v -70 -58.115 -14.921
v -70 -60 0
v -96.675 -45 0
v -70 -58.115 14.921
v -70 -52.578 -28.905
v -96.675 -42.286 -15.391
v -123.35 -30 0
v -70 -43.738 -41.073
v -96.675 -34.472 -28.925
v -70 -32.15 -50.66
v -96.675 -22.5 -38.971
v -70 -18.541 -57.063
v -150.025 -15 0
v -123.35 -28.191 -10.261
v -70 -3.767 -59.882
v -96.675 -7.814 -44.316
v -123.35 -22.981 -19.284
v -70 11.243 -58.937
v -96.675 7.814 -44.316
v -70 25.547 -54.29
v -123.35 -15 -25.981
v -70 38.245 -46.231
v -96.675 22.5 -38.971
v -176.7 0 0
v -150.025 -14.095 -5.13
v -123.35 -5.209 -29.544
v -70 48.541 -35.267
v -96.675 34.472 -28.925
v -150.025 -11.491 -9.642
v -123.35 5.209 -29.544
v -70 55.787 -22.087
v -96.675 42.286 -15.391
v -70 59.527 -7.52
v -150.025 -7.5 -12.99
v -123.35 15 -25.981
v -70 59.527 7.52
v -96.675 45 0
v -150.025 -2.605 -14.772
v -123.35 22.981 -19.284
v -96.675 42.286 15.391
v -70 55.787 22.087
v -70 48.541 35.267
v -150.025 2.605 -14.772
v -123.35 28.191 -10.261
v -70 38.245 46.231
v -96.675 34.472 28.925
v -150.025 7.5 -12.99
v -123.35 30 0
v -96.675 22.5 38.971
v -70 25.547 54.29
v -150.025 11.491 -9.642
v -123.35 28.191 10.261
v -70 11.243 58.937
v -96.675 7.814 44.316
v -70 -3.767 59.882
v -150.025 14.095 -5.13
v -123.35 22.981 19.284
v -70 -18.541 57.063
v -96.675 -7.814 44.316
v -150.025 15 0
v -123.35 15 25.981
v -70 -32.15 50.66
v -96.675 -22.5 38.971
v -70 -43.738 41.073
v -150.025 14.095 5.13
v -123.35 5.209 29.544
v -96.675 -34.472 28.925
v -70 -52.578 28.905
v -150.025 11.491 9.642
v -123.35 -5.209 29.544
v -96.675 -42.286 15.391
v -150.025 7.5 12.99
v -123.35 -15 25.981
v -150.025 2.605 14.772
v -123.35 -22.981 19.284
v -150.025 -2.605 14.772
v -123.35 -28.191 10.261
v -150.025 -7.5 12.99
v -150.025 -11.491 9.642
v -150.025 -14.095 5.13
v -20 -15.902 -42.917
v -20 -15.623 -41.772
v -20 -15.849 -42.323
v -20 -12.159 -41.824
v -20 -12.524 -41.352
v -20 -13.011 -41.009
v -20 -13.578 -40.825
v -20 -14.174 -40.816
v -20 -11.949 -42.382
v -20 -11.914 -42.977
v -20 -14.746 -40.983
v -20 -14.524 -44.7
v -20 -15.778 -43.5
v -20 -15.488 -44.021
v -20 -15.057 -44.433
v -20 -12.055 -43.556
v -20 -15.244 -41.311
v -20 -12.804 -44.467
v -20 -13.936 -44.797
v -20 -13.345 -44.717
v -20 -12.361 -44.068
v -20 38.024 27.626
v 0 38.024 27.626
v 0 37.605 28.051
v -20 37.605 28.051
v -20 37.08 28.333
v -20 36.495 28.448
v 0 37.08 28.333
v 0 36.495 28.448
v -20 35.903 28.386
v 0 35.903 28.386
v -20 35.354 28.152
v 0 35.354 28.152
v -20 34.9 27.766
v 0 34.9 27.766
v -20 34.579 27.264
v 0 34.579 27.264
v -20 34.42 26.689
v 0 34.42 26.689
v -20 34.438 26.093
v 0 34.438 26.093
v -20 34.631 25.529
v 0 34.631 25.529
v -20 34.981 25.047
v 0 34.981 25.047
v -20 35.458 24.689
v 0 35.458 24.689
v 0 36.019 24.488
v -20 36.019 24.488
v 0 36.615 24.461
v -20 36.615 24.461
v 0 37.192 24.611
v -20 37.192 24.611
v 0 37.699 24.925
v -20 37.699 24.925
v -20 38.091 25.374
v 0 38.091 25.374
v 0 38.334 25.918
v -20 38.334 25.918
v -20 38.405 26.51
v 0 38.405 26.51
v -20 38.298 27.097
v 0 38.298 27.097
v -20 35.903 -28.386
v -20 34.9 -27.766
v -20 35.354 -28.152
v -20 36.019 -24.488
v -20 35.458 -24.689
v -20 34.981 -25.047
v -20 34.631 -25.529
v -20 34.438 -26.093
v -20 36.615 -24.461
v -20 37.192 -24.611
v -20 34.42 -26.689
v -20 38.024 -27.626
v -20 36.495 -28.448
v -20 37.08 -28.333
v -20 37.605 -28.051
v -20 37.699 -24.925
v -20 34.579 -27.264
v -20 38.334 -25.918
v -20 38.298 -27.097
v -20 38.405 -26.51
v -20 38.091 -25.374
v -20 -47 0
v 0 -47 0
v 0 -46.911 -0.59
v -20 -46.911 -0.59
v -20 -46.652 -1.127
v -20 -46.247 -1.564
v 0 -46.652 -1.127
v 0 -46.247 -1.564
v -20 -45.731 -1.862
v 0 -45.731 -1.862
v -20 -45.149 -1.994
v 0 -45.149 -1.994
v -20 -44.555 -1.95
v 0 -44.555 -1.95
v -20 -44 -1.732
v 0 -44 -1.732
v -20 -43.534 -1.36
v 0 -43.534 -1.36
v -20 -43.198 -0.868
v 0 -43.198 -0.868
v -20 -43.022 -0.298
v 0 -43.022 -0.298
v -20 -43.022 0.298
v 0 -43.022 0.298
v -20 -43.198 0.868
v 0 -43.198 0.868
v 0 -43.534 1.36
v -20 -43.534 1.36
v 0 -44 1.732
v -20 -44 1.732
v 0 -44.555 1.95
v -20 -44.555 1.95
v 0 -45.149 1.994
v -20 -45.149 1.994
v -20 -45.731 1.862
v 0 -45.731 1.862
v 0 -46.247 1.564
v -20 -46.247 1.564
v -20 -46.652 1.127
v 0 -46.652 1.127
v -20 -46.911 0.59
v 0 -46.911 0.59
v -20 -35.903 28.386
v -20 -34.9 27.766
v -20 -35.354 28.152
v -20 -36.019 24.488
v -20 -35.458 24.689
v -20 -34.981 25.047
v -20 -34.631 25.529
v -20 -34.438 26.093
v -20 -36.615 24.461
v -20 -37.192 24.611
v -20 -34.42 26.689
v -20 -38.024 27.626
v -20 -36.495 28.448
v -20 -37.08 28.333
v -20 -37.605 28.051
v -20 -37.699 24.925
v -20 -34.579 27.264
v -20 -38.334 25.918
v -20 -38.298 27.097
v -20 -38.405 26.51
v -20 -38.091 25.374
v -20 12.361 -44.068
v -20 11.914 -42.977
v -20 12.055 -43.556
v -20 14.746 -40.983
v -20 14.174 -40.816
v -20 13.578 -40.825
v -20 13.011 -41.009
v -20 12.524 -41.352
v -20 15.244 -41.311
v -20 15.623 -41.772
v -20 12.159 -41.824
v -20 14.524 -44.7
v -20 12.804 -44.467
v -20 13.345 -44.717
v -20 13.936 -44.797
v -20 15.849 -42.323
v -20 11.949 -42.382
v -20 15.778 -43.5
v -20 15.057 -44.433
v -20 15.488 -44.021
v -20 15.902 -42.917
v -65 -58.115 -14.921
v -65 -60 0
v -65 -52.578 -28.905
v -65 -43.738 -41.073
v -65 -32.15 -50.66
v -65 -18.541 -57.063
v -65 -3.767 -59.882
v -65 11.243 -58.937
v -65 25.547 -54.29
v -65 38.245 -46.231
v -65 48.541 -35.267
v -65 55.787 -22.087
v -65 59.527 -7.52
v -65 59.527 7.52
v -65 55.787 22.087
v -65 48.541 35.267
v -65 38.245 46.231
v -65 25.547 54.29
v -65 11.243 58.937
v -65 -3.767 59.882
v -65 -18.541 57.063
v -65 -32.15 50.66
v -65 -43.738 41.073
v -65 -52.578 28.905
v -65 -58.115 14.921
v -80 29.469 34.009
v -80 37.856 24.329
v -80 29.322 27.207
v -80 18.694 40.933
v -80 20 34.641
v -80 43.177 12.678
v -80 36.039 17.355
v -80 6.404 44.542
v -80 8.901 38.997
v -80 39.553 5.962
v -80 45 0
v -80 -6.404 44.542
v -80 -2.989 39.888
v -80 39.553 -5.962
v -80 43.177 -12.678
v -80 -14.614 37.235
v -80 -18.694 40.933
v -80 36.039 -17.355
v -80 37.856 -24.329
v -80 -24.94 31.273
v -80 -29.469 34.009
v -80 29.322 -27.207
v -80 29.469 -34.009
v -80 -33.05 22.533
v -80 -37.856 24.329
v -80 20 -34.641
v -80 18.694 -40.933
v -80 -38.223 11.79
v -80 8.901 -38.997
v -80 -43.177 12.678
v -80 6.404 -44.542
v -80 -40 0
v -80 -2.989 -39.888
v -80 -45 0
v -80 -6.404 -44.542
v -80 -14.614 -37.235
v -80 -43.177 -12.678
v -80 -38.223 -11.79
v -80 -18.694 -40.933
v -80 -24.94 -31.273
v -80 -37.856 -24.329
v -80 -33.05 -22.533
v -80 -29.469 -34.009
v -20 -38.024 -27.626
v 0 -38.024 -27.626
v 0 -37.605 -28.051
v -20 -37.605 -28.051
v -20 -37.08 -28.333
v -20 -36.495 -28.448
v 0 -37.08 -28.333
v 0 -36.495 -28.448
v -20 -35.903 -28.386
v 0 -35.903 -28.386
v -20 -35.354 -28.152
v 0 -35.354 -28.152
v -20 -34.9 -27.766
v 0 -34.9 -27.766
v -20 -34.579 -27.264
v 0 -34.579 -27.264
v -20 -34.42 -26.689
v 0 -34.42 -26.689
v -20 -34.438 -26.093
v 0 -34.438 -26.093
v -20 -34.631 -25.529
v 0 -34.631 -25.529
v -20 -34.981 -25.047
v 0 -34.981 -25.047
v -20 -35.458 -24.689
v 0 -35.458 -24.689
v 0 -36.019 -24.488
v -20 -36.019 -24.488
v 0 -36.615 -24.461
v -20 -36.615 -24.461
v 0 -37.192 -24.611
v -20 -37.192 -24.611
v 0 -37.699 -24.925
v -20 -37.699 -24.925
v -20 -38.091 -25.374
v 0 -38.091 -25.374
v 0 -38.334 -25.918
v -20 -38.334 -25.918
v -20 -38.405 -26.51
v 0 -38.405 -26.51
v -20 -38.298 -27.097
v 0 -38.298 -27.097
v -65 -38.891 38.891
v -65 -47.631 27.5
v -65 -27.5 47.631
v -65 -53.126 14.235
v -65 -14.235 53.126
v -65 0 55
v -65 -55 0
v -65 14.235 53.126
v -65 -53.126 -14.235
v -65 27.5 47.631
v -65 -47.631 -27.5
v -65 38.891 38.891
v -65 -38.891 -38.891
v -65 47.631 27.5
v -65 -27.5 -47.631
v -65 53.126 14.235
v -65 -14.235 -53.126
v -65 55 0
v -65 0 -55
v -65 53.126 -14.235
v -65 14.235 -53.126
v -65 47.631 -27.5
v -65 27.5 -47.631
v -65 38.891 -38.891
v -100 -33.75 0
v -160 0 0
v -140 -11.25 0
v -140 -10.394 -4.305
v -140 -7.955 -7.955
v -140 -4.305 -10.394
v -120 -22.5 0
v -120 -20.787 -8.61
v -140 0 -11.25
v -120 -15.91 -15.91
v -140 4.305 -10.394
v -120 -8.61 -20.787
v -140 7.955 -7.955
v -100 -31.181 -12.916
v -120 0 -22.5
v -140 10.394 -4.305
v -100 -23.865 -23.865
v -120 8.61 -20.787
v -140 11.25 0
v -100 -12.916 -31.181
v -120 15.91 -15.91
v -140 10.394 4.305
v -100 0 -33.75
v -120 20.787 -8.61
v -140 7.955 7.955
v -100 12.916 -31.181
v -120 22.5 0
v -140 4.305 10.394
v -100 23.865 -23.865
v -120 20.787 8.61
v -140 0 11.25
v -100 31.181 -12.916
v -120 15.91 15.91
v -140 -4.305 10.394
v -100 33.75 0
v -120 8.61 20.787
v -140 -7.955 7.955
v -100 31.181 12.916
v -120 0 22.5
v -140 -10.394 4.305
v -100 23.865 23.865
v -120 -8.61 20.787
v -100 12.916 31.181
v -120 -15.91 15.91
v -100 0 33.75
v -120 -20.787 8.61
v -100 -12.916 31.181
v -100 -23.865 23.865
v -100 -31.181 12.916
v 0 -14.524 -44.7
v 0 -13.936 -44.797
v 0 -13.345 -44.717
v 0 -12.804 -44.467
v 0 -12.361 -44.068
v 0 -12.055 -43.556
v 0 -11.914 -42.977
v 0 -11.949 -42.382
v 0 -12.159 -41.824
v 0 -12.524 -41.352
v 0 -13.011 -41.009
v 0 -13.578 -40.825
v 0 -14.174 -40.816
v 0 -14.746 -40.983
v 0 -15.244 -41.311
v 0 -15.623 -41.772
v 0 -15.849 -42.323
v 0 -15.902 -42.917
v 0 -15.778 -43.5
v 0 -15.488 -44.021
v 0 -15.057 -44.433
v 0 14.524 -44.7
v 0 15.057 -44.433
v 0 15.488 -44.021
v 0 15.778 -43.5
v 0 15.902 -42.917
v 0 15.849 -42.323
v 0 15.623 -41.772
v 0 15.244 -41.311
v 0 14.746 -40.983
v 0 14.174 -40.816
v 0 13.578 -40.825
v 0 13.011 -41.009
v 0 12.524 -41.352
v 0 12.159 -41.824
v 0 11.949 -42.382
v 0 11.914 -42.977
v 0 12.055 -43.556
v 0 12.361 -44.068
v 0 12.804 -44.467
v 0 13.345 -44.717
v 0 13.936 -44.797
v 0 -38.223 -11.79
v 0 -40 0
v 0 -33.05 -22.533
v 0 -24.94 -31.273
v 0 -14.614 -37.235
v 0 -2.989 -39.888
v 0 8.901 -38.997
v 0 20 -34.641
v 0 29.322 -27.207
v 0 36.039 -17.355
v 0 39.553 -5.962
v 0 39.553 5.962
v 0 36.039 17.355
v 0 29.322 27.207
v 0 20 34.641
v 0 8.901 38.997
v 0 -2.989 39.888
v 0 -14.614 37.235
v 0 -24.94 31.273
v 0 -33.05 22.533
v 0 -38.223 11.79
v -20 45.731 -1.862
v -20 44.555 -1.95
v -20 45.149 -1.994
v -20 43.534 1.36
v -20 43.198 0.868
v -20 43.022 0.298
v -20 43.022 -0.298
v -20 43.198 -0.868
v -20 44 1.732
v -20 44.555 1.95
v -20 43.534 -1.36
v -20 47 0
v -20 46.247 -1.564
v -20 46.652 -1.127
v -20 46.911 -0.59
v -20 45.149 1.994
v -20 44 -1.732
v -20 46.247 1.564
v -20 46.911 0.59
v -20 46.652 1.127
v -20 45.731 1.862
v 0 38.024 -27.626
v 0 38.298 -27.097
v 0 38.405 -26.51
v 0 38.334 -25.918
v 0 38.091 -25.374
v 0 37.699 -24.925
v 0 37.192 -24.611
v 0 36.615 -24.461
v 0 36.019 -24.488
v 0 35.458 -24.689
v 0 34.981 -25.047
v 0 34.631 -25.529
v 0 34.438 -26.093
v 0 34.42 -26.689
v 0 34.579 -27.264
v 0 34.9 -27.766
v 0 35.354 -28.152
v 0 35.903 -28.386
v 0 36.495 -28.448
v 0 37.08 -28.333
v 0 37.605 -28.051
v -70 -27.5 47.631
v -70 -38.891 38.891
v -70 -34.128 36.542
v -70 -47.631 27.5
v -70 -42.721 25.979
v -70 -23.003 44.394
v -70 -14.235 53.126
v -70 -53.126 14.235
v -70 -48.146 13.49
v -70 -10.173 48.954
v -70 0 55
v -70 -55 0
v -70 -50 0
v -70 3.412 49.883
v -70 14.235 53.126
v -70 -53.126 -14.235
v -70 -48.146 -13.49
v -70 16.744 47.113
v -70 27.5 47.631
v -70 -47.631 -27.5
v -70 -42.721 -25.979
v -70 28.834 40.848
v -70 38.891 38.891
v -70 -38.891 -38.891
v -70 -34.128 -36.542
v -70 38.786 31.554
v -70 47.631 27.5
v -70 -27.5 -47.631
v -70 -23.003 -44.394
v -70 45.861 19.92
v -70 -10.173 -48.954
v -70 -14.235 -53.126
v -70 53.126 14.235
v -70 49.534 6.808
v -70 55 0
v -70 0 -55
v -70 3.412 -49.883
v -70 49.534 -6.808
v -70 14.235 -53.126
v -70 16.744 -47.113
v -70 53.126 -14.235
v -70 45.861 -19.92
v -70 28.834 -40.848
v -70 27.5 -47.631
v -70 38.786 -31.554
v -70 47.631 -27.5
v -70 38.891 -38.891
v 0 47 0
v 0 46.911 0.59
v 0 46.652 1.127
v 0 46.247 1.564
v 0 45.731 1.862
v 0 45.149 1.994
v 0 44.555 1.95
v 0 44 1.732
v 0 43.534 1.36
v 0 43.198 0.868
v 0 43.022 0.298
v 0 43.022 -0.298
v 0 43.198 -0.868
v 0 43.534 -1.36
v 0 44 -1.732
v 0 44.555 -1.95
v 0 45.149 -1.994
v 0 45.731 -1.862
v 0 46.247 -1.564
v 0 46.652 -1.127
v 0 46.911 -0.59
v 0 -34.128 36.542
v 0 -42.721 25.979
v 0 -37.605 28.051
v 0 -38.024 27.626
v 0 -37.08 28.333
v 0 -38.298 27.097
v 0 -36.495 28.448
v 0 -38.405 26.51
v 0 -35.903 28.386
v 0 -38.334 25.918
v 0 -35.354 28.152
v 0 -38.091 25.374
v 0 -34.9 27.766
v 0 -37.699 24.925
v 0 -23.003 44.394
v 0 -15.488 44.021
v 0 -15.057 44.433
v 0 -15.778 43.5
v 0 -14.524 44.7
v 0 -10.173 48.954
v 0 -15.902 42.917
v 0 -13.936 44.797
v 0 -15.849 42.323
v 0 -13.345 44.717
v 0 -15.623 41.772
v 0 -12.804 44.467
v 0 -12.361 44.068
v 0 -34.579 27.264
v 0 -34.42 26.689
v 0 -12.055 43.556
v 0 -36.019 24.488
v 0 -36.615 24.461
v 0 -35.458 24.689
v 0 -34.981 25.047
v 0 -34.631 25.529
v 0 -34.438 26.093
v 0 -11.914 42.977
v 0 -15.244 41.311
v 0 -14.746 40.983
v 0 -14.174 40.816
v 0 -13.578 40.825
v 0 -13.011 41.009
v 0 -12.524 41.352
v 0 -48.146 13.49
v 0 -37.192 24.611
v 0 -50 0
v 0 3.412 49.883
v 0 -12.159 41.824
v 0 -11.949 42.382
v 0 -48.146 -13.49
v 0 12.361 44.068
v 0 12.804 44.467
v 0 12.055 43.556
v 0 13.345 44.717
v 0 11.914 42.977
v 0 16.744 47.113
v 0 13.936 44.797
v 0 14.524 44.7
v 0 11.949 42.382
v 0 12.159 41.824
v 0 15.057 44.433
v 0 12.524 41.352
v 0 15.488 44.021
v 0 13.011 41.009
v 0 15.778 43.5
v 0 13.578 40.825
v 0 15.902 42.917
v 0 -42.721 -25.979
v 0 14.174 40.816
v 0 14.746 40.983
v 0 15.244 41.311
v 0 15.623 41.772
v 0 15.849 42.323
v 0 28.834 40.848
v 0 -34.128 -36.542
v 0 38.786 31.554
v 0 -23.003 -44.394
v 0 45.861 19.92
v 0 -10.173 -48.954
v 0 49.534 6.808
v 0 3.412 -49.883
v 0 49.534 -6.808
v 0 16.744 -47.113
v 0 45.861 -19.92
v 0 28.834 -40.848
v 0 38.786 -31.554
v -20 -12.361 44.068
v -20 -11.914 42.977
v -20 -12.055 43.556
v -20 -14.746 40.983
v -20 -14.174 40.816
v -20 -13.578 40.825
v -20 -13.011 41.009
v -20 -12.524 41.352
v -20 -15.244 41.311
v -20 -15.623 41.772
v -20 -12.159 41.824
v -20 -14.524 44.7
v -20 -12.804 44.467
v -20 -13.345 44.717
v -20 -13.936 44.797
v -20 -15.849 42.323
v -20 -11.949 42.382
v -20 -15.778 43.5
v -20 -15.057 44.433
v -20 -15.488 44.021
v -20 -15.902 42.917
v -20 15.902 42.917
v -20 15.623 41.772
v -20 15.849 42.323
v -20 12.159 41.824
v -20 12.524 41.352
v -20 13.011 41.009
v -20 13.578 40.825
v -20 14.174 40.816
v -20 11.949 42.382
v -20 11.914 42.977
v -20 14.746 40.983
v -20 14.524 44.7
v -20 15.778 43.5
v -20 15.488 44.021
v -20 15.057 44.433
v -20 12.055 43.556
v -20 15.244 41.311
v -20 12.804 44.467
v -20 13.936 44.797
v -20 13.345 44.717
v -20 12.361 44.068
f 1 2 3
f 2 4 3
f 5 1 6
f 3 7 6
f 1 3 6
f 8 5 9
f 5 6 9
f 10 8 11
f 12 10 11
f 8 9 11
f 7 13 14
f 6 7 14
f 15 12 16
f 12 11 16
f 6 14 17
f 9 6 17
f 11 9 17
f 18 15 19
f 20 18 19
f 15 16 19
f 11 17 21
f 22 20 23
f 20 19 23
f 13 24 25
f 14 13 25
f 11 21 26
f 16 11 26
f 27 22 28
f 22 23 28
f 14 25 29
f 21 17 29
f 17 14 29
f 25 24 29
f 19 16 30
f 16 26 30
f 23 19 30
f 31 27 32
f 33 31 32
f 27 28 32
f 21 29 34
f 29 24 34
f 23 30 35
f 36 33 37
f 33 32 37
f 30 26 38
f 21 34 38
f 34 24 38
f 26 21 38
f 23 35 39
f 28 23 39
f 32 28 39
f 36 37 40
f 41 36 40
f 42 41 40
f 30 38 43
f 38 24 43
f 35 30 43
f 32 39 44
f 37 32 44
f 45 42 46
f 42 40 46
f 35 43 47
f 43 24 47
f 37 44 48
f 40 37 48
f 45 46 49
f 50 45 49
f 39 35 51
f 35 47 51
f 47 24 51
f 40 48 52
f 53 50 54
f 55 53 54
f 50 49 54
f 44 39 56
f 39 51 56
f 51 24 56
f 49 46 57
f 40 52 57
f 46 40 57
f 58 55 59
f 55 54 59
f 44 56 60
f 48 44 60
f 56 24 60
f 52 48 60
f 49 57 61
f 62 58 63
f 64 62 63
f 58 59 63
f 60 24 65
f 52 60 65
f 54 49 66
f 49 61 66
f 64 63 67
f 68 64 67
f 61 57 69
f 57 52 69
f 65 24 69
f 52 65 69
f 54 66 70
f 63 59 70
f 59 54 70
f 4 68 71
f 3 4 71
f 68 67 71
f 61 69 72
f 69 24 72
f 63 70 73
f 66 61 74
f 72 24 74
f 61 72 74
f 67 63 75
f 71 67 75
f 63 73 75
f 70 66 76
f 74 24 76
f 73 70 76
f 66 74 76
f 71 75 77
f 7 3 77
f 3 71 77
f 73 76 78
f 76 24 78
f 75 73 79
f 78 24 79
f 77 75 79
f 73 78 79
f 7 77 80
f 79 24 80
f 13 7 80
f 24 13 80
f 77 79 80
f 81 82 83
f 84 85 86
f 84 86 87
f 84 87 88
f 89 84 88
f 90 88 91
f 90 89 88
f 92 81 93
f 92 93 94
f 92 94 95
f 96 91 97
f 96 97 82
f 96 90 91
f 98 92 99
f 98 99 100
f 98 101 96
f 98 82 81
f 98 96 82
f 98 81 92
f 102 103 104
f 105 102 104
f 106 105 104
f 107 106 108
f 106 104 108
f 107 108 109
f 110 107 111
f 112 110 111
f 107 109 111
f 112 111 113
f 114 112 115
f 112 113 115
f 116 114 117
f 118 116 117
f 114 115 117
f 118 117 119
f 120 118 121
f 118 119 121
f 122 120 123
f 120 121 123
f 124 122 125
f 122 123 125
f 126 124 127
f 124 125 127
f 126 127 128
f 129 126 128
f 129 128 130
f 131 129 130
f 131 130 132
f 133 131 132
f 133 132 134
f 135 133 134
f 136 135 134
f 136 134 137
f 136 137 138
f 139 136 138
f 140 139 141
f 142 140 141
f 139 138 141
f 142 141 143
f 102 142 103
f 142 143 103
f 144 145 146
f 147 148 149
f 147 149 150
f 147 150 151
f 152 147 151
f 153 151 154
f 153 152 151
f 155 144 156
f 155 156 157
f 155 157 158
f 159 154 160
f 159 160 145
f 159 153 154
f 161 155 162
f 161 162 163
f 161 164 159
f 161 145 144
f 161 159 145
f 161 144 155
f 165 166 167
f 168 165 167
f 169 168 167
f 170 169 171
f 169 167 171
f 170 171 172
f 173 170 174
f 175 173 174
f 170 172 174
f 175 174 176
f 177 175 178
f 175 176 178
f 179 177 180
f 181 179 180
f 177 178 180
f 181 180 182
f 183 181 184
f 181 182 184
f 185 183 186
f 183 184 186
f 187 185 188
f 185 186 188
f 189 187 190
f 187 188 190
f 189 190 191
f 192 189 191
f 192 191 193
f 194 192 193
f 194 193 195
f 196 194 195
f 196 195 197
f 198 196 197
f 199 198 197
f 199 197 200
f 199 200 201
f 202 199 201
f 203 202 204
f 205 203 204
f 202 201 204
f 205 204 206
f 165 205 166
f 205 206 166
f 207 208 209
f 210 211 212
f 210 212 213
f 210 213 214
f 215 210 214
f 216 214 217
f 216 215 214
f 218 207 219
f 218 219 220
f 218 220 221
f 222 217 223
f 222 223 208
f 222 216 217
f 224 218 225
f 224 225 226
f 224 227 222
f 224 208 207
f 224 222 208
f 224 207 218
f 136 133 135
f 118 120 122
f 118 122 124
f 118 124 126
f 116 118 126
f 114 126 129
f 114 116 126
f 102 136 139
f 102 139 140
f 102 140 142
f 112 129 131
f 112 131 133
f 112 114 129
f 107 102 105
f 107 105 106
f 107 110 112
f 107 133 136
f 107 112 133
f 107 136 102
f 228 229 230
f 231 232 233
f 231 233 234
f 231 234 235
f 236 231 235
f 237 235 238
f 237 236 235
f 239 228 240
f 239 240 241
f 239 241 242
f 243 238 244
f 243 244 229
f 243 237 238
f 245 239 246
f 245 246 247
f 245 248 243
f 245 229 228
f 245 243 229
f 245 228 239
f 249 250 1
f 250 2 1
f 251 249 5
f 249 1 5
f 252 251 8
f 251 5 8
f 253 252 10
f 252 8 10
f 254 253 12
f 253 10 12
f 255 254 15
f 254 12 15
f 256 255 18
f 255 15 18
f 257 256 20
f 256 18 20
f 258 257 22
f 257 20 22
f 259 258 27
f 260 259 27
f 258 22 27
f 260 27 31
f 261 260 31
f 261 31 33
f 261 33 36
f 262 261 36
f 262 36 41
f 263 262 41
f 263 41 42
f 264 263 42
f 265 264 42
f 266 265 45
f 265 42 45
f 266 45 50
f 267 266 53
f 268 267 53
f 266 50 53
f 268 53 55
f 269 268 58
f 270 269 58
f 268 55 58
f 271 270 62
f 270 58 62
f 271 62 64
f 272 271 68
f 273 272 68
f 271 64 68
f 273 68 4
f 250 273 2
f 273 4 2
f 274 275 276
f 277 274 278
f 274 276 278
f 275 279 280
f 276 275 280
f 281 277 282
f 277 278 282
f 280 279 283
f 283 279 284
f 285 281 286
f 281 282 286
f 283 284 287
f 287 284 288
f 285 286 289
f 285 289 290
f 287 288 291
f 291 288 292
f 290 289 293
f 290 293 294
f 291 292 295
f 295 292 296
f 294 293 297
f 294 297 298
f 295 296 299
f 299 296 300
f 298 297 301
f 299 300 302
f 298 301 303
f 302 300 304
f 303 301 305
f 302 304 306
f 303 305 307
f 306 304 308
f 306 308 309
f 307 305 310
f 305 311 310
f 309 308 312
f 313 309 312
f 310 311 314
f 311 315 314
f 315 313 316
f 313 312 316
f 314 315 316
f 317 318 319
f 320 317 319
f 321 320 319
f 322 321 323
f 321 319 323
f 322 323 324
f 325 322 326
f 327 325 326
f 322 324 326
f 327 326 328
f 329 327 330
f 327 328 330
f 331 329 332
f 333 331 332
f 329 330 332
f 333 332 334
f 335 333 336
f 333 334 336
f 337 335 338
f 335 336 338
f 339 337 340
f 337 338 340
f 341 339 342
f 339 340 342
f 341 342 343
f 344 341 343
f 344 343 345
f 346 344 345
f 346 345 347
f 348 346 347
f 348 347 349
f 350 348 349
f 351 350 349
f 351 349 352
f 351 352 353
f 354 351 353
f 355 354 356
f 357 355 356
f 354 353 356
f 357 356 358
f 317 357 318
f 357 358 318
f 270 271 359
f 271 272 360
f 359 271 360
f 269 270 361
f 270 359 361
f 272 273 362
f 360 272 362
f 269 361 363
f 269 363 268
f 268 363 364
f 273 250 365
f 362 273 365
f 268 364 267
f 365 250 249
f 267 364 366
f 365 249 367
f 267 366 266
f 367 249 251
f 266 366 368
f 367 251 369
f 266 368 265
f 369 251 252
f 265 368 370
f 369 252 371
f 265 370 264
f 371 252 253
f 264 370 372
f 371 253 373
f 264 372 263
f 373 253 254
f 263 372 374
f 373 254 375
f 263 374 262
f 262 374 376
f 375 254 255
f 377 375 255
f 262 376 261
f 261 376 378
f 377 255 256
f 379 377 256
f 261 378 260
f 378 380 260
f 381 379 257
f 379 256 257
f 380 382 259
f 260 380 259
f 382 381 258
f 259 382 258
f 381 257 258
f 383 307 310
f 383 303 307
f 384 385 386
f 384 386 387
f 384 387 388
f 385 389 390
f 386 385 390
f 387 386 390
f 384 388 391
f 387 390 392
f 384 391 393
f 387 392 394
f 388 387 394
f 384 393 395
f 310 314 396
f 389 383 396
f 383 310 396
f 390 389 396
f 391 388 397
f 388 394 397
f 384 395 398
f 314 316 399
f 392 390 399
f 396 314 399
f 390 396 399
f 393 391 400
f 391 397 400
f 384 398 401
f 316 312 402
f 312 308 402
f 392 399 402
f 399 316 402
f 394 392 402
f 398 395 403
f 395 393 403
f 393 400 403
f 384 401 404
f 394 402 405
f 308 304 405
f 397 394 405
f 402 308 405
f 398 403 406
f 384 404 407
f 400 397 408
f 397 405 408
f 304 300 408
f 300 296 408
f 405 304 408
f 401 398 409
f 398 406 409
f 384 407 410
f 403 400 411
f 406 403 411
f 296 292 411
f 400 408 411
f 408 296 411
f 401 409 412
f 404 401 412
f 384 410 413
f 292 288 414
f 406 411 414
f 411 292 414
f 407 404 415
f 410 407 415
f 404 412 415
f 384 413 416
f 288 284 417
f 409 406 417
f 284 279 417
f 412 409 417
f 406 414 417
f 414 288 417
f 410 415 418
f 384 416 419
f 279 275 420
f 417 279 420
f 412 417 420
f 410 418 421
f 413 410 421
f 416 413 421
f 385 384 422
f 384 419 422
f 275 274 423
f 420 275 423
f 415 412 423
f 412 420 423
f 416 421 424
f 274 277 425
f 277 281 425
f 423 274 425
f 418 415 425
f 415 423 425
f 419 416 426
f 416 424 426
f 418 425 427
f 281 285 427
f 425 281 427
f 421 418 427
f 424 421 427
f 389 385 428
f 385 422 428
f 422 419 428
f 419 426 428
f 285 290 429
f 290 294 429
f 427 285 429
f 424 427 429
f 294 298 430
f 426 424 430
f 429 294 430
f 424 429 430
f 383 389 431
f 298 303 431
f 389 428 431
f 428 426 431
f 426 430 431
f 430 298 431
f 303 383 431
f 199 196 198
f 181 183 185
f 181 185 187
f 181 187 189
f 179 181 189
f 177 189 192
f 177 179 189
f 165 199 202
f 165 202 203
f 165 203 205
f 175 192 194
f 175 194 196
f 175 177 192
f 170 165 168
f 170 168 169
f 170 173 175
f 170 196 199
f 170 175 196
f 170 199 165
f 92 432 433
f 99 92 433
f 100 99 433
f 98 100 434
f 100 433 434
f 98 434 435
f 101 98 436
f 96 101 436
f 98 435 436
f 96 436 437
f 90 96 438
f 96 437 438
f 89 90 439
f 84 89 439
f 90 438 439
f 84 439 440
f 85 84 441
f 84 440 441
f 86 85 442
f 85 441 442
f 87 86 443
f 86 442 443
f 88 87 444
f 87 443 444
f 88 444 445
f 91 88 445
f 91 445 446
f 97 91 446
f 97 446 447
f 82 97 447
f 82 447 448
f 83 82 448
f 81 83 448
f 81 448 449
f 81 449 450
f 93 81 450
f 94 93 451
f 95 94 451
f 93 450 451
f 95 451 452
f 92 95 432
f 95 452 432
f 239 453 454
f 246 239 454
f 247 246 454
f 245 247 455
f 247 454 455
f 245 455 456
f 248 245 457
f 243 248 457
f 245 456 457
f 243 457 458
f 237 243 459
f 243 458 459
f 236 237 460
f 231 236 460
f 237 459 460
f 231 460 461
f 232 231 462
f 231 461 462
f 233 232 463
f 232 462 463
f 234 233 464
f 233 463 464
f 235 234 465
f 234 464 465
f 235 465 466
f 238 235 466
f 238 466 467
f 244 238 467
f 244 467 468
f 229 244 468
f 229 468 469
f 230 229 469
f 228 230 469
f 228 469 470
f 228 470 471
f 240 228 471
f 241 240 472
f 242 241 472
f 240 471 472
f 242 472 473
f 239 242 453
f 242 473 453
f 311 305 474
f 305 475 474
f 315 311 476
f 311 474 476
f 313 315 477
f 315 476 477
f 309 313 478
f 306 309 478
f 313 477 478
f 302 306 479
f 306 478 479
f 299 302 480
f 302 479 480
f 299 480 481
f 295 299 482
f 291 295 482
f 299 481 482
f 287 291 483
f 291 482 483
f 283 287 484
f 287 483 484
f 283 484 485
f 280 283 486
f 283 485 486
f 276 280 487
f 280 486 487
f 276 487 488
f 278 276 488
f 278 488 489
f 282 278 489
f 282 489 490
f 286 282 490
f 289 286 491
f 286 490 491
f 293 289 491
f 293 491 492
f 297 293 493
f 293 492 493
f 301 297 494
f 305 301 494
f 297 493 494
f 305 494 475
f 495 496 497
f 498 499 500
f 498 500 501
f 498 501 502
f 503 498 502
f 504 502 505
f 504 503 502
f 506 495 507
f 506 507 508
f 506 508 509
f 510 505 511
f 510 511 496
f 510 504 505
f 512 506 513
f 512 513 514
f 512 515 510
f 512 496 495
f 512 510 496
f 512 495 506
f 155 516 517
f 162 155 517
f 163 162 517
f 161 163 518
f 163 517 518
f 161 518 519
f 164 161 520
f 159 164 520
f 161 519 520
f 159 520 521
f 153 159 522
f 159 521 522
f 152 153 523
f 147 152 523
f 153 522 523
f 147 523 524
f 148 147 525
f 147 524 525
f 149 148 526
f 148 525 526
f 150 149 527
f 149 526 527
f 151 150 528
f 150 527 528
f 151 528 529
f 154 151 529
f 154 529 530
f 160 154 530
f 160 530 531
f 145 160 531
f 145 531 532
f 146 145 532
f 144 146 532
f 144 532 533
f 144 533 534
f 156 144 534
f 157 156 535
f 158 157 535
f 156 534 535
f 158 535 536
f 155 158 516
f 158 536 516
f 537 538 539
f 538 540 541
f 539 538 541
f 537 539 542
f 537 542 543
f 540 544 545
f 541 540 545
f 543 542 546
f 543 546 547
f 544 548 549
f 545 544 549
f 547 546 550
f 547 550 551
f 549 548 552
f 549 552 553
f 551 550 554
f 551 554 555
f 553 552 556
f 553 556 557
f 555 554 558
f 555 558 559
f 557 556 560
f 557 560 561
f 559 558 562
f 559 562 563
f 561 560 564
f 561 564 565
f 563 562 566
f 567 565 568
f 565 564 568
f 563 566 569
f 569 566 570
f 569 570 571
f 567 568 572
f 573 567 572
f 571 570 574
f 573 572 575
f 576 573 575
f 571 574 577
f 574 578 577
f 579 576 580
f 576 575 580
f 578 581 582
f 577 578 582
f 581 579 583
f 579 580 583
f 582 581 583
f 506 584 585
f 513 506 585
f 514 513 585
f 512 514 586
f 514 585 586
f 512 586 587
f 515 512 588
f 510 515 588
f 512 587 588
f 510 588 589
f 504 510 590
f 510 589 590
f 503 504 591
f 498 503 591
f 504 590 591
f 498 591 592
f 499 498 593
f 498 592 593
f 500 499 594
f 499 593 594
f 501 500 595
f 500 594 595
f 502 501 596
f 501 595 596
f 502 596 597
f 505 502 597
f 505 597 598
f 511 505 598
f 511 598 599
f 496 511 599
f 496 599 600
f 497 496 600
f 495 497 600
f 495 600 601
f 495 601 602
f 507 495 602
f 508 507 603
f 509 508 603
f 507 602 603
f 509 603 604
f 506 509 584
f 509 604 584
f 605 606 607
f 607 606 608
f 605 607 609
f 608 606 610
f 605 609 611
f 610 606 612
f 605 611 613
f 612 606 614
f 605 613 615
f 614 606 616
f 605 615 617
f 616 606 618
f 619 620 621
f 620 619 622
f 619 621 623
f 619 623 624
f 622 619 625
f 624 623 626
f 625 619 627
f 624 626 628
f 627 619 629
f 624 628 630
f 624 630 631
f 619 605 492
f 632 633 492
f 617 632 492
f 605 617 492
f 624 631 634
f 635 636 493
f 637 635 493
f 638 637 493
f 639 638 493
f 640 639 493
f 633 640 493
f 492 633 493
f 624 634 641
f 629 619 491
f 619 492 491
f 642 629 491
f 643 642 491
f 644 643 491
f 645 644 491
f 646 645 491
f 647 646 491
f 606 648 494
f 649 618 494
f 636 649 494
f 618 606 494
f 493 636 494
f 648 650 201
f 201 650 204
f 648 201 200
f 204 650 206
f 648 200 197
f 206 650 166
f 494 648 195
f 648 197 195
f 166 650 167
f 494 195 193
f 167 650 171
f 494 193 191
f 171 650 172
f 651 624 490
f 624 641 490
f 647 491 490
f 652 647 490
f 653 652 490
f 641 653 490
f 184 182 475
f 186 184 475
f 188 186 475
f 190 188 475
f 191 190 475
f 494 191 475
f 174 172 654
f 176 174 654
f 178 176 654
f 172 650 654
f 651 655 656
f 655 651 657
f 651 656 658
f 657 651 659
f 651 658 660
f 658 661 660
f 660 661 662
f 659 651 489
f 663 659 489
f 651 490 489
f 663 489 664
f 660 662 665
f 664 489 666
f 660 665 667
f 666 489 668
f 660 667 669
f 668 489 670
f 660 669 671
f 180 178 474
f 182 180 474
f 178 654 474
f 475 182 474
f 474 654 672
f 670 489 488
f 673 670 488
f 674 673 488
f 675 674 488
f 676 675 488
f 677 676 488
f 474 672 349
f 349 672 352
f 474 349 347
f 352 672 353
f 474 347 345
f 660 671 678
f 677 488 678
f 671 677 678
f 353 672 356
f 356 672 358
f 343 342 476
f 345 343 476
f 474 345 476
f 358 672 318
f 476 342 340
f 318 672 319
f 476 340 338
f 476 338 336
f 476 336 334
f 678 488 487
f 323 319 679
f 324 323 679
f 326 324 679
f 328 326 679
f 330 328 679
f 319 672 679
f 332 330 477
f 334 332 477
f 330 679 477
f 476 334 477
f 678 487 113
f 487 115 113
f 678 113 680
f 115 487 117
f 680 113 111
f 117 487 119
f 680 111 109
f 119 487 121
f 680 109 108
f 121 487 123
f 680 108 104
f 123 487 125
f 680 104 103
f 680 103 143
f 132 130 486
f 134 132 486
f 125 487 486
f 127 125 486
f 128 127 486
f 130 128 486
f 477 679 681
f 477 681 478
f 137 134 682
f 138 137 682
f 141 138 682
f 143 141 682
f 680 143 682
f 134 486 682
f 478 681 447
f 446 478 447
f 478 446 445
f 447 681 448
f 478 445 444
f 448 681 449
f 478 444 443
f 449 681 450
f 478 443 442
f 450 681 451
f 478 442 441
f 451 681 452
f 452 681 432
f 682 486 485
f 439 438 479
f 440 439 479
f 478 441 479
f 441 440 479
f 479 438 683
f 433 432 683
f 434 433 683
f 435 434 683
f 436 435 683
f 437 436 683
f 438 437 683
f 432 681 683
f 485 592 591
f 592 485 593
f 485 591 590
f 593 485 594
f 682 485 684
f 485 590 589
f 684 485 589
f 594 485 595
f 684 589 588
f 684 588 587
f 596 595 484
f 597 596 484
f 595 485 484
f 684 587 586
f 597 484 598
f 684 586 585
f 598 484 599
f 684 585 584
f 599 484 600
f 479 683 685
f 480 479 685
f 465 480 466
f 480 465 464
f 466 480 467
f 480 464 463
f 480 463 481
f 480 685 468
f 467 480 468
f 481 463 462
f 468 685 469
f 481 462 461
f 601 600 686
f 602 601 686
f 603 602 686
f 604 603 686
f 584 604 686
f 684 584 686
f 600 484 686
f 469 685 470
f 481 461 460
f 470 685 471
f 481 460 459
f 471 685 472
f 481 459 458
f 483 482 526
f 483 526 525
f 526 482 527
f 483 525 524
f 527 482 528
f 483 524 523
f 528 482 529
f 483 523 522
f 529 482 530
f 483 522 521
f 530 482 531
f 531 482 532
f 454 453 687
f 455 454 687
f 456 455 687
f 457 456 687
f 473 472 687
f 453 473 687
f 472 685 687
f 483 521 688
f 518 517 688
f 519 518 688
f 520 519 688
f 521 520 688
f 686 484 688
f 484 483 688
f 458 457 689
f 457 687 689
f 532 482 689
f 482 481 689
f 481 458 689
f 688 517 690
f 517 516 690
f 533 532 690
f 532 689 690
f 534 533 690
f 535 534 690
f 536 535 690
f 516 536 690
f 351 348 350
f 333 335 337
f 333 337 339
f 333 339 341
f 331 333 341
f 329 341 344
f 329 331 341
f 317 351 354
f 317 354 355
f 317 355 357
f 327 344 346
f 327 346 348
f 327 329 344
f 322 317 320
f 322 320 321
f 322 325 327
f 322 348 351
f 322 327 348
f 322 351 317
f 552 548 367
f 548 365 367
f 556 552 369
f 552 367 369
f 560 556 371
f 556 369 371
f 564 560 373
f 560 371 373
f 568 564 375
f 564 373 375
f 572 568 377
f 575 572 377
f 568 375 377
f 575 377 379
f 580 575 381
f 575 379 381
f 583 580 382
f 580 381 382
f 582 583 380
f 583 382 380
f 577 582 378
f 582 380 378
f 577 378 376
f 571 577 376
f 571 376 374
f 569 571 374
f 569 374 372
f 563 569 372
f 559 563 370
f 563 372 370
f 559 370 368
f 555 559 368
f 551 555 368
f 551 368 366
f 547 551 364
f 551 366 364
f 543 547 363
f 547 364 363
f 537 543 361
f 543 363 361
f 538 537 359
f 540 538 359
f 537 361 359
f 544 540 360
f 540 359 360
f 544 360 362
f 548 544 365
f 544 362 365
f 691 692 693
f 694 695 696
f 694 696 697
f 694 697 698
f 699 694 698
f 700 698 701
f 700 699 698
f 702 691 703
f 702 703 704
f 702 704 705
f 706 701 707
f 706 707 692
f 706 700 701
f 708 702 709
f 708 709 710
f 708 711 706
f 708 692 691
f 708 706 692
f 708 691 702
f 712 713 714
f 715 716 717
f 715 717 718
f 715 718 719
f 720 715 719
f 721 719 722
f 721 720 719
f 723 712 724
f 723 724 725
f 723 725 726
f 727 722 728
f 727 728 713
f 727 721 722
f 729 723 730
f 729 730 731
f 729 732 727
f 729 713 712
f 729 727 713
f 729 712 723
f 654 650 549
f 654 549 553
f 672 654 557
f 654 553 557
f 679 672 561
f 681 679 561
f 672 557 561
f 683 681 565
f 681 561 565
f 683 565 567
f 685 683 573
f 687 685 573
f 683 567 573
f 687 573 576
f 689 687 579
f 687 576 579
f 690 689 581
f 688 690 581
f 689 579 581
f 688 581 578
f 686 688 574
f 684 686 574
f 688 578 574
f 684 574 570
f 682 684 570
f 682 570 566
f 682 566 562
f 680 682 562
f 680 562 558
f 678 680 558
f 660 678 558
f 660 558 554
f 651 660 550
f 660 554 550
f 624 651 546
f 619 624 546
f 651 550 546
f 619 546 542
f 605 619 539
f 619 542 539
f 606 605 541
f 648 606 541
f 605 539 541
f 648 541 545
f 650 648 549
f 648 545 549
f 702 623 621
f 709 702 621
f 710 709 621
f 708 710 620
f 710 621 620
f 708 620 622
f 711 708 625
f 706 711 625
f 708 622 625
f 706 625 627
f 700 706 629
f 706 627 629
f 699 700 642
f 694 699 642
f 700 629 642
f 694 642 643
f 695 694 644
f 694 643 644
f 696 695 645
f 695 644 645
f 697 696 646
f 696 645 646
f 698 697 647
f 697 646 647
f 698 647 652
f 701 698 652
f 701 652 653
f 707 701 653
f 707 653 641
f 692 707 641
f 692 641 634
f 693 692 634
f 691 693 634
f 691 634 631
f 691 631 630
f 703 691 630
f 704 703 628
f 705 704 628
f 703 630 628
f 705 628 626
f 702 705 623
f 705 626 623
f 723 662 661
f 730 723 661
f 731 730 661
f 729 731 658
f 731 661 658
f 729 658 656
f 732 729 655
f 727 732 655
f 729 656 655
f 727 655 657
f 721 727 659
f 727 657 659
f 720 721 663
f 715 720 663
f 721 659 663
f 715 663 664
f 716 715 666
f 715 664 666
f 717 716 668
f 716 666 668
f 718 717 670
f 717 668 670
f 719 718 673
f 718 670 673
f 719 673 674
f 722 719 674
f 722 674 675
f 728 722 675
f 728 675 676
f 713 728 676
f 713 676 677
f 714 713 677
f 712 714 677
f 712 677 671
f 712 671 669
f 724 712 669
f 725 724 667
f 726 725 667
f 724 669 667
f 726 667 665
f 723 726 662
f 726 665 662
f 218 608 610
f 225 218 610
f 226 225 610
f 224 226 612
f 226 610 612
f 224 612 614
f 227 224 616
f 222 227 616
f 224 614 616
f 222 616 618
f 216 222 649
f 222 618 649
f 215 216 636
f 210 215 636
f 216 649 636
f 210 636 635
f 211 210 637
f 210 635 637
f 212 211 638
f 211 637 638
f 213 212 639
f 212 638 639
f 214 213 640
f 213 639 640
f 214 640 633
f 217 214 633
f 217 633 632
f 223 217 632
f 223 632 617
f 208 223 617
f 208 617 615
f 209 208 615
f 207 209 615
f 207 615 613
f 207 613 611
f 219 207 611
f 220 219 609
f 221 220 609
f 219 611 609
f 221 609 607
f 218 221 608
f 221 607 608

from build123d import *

# Parameters (mm, degrees)
SKETCH2_R          = 2
CUT_EXTRUDE1_DEPTH = 20
CIRPATTERN1_COUNT  = 10


with BuildPart() as part:
    # Sketch1 → Revolve2 (revolve)
    with BuildSketch(Plane.XY, mode=Mode.PRIVATE) as revolve2_sk:
        Polygon((-65, 60), (-70, 60), (-176.700455888, 0), (-160, 0), (-80, 45), (-80, 40), (0, 40), (0, 50), (-70, 50), (-70, 55), (-65, 55), align=None)
    revolve(revolve2_sk.sketch.rotate(Axis((-123.889506721, 0, 0), (1, 0, 0)), 180), axis=Axis((-123.889506721, 0, 0), (1, 0, 0)))

    # Sketch2 → Cut-Extrude1 (cut)
    with BuildSketch(Plane(origin=(0, 0, 0), x_dir=(0, 0, -1), z_dir=(1, 0, 0))):
        with Locations(Location((0, 45, 0), (0, 0, 90))):
            Circle(SKETCH2_R)
    cut_extrude1 = extrude(amount=-CUT_EXTRUDE1_DEPTH, mode=Mode.SUBTRACT)

    # CirPattern1: Cut-Extrude1 ×10 about axis
    cirpattern1_axis = Axis((0, 0, 0), (1, 0, 0))
    for i in range(1, CIRPATTERN1_COUNT):
        add(cut_extrude1.rotate(cirpattern1_axis, i * 360 / CIRPATTERN1_COUNT), mode=Mode.SUBTRACT)


solid = part.part
